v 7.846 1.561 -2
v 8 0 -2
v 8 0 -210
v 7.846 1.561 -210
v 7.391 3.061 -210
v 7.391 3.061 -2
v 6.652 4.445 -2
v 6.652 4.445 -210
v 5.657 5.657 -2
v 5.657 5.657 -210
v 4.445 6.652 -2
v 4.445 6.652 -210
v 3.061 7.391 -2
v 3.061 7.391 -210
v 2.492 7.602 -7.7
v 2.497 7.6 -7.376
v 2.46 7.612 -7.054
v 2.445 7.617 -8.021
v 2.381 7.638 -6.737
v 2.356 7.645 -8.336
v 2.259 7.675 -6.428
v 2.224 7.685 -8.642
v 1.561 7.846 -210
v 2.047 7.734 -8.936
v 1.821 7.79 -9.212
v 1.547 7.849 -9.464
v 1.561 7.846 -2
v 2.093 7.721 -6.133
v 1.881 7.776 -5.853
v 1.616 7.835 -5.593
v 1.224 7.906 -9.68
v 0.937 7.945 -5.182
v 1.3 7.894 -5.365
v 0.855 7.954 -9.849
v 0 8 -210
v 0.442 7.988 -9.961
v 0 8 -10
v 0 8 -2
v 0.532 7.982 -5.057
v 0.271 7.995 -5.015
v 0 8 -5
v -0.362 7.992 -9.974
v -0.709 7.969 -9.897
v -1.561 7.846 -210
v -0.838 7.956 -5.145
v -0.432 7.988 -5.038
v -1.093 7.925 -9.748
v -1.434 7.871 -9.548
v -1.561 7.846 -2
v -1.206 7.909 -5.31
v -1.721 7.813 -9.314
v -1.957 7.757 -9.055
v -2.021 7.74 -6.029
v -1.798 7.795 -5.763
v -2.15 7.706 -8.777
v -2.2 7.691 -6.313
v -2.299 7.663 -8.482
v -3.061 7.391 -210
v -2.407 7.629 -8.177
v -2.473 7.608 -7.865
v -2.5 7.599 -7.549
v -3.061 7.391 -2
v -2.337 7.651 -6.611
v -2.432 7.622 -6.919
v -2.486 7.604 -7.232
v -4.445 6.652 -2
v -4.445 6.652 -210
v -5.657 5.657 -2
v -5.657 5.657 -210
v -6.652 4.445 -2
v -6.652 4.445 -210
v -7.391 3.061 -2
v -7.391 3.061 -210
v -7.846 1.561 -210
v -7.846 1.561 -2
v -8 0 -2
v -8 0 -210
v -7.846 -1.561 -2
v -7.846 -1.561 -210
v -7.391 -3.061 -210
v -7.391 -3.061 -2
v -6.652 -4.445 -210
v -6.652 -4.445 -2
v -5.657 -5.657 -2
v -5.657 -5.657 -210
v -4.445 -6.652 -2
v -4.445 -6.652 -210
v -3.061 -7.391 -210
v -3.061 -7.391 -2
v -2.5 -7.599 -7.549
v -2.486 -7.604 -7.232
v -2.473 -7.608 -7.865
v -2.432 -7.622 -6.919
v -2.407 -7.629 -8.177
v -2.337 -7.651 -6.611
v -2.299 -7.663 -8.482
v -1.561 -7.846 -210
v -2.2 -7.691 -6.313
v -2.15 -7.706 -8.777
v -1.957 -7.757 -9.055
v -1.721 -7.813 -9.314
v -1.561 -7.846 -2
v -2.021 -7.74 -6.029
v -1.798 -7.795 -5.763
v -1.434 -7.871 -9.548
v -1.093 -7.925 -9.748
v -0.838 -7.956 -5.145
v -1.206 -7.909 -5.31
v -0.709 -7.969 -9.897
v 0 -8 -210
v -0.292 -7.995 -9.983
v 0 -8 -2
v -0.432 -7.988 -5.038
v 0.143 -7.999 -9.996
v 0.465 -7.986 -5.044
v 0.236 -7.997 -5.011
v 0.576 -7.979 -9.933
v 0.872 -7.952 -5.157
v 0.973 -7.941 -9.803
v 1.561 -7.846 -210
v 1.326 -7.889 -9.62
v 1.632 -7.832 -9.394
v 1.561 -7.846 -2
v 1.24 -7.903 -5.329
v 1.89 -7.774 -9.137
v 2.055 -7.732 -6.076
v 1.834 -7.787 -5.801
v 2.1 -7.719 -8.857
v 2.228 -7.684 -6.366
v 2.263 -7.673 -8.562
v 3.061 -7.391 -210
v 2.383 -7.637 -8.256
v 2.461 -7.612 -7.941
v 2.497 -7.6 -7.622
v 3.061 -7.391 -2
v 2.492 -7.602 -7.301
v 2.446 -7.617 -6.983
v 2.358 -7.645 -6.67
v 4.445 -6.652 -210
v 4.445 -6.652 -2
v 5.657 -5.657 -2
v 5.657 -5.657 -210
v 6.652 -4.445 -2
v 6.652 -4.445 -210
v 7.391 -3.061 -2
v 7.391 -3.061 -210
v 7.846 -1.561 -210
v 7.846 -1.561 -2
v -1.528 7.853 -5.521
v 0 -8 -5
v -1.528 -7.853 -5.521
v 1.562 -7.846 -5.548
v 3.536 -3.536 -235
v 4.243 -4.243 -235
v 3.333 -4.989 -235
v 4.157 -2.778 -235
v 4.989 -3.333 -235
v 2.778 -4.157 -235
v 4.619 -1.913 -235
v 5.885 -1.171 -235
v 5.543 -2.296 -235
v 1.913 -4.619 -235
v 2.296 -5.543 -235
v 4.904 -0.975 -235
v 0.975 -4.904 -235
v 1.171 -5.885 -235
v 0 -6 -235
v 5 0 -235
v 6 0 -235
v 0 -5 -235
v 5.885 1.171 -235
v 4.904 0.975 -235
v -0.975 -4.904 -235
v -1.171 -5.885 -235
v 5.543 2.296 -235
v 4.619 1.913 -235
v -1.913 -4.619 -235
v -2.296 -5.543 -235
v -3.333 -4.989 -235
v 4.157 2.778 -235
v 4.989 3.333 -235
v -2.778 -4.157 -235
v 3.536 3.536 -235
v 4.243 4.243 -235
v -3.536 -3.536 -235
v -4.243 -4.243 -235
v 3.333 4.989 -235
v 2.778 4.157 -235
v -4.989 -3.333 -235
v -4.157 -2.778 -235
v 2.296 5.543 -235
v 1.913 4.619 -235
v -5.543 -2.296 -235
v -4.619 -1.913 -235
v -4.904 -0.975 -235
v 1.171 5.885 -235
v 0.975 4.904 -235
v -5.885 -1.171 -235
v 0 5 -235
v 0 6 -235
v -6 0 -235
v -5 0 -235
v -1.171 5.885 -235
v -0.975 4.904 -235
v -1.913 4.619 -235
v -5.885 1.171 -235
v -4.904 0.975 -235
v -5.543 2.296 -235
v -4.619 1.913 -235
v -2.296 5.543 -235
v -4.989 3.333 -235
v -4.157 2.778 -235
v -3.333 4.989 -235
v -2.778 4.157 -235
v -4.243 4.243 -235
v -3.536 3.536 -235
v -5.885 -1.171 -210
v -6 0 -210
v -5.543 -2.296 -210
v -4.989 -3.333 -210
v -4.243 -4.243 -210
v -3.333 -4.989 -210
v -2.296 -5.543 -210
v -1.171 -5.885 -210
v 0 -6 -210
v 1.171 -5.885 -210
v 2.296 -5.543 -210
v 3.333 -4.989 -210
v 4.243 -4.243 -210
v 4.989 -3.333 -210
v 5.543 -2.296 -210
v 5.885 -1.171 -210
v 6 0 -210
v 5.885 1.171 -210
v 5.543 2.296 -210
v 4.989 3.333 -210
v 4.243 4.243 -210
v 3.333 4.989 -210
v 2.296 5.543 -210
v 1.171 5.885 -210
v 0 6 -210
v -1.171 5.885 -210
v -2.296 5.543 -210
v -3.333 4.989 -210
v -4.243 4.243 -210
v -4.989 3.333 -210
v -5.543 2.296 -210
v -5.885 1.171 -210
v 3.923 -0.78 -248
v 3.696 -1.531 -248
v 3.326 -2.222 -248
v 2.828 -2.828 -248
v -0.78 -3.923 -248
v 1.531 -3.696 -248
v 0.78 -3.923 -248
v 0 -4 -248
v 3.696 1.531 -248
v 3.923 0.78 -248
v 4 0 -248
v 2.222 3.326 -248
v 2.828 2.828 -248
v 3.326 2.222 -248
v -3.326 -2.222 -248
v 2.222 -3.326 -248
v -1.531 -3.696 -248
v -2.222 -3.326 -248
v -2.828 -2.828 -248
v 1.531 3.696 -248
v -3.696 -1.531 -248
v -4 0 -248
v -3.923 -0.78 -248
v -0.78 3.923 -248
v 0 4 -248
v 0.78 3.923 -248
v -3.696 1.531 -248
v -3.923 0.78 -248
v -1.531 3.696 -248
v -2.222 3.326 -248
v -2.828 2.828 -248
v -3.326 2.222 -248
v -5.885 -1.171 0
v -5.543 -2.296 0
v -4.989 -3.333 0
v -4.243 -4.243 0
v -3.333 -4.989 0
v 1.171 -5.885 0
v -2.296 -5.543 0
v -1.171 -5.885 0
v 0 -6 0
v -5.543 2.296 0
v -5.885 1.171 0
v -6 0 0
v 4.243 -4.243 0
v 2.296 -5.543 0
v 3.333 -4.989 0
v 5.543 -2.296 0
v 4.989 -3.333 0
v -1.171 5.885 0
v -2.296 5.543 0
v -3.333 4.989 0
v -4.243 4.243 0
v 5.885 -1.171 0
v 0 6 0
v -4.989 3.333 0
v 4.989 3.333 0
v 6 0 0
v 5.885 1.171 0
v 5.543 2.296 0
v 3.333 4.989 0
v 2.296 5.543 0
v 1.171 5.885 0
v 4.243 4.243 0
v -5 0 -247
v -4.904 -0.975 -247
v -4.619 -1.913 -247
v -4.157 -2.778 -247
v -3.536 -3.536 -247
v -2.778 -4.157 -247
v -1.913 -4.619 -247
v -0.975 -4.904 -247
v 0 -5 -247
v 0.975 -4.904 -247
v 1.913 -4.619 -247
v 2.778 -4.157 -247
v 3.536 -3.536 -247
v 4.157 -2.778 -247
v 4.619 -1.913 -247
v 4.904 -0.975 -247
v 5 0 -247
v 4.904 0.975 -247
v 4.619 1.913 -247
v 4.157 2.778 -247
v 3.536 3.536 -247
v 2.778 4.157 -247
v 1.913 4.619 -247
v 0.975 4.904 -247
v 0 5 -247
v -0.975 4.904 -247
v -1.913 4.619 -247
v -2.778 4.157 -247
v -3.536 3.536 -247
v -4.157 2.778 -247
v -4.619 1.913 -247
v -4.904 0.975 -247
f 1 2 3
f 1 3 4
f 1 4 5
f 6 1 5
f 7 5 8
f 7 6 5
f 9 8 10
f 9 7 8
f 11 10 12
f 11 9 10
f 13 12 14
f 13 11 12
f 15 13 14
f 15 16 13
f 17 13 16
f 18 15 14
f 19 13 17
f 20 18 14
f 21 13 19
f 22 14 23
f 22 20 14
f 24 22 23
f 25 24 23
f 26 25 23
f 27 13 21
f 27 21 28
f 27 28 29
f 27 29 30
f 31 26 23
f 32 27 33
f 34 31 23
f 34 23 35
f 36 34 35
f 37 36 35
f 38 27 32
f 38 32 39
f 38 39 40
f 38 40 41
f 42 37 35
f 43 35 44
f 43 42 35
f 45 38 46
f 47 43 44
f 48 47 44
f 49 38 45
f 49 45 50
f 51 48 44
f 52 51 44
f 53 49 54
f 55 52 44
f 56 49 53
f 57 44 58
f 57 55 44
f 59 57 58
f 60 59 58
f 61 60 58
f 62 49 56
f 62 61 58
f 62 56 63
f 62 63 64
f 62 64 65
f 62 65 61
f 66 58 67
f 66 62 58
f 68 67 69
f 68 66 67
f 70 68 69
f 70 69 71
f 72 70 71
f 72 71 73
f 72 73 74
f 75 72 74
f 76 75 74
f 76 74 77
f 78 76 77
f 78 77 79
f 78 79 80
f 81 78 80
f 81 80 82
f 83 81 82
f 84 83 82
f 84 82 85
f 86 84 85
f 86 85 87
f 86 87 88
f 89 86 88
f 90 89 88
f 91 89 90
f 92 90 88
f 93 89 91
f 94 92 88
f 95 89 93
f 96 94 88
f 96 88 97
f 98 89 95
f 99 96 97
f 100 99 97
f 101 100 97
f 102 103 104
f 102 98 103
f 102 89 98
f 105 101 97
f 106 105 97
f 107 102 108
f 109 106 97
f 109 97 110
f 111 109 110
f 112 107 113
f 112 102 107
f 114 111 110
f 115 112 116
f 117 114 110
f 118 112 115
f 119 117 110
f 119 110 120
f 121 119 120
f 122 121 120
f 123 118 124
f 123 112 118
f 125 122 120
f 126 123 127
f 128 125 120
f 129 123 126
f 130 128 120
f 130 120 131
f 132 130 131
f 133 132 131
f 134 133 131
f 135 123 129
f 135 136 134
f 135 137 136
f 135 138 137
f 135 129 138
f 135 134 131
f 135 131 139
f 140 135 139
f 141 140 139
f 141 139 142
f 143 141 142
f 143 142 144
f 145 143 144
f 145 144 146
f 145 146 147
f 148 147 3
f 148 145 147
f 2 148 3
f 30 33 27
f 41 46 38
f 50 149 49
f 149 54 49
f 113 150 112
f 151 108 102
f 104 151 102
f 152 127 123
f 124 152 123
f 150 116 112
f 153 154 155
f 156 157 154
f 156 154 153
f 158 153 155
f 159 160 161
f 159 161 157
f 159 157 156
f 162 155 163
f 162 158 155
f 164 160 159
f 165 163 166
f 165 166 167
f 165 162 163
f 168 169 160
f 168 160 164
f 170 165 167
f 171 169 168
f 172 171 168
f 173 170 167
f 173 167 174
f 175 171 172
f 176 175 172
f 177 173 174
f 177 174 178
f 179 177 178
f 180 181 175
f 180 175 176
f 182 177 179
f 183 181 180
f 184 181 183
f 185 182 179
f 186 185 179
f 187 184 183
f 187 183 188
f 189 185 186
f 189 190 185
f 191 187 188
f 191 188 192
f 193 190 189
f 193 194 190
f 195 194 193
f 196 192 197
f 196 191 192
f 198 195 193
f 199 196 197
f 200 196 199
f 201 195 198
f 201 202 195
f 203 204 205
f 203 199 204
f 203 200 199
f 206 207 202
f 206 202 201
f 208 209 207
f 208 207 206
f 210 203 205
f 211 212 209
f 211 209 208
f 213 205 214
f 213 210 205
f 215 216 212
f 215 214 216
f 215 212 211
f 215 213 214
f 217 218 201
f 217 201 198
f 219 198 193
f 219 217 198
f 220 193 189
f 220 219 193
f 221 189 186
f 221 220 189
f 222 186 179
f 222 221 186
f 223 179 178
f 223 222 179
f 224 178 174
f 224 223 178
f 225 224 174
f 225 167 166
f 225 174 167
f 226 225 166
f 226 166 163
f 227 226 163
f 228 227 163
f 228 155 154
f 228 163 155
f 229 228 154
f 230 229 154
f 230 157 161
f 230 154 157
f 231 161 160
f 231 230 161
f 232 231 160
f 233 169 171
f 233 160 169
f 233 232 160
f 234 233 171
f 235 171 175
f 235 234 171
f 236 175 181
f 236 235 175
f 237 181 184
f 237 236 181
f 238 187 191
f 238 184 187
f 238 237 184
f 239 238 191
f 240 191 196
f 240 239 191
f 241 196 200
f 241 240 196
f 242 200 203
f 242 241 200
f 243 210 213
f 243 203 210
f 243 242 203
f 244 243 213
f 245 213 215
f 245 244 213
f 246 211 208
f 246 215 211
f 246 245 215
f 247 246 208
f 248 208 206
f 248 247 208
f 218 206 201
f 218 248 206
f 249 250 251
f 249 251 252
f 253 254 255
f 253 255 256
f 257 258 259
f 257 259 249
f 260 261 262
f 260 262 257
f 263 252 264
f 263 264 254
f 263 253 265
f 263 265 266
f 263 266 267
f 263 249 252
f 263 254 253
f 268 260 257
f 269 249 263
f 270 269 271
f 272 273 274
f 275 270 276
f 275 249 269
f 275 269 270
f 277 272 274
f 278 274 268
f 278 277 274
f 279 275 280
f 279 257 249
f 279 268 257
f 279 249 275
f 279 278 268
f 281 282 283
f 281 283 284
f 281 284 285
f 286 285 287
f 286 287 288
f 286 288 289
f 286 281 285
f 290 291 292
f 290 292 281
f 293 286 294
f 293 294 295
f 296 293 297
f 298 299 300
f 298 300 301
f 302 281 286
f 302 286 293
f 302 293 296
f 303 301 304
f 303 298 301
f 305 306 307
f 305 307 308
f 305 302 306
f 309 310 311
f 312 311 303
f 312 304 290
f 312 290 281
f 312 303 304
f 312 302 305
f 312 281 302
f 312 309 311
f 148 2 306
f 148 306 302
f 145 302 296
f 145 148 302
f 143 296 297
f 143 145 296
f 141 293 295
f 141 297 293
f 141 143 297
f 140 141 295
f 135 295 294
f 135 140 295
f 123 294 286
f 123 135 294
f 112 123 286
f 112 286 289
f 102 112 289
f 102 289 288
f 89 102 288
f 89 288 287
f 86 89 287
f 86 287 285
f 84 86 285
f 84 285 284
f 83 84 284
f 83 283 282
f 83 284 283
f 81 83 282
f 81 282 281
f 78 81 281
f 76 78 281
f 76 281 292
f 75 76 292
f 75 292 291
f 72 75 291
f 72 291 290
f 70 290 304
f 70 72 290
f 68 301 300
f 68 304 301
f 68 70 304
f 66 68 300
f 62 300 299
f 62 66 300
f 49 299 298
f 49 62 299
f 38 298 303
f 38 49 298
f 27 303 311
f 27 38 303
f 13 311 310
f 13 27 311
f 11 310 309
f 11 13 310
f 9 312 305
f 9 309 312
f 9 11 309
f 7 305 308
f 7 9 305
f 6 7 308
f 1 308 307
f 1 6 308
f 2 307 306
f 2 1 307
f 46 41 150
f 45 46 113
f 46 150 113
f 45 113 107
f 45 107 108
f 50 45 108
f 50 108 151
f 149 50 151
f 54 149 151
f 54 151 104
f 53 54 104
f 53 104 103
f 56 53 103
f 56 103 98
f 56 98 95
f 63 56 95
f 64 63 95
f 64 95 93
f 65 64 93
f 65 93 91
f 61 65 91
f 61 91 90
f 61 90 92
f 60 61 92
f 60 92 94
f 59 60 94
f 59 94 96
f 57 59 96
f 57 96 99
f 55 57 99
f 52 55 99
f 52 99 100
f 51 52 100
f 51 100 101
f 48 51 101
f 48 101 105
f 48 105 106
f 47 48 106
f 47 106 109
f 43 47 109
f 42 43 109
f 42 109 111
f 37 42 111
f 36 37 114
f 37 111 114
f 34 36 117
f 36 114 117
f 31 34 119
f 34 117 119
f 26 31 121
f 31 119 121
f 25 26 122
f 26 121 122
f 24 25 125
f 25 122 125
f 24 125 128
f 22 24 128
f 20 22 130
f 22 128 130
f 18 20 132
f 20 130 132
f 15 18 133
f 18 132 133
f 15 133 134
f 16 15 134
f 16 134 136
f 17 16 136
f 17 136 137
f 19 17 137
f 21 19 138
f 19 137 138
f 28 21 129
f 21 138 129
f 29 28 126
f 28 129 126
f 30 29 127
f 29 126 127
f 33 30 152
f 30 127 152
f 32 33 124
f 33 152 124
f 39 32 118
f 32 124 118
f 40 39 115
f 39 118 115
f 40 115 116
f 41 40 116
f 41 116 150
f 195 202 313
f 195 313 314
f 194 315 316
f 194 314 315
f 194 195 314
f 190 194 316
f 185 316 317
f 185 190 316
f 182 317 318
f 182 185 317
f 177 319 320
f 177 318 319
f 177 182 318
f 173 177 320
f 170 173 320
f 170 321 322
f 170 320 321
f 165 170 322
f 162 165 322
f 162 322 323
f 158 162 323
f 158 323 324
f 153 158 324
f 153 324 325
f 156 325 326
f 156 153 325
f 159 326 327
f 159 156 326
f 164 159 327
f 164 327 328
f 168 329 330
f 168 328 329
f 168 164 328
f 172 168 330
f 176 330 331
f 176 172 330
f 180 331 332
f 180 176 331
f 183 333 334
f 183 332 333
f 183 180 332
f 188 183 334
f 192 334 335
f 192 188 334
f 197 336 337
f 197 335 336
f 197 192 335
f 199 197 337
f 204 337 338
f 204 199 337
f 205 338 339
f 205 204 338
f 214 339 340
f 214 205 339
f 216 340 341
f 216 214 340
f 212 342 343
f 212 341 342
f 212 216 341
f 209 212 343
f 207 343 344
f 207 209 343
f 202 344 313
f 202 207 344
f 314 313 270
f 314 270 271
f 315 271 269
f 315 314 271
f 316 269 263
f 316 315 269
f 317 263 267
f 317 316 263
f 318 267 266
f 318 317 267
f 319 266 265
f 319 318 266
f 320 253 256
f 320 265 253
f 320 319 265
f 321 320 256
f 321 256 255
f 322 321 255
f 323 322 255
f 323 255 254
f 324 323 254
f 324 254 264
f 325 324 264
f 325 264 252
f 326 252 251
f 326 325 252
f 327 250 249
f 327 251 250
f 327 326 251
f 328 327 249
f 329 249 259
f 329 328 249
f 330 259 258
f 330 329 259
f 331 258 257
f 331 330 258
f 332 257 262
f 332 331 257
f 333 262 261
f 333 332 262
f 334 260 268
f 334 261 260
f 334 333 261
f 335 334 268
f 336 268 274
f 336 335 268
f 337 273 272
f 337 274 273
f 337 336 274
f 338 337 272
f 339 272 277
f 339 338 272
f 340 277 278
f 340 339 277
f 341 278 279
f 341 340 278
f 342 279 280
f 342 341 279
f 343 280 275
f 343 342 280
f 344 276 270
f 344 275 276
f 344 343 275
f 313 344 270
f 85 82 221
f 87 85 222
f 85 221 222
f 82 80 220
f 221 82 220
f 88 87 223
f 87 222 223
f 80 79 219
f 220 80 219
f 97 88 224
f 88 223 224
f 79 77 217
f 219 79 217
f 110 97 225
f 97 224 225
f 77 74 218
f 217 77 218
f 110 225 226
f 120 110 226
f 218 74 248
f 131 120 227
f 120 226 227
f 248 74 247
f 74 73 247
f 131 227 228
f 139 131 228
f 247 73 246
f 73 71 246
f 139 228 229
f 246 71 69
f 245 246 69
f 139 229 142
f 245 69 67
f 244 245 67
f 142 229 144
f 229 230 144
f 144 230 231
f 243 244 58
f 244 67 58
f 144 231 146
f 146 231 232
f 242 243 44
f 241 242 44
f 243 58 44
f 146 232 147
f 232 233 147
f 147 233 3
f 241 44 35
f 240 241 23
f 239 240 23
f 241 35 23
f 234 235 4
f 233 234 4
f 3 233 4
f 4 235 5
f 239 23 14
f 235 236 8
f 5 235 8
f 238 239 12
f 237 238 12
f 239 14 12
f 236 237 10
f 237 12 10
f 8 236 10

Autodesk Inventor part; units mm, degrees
ref_plane "YZ Plane" through (0, 0, 0) normal (1, 0, 0) x (0, 1, 0)
ref_plane "XZ Plane" through (0, 0, 0) normal (0, 1, 0) x (-1, 0, 0)
ref_plane "XY Plane" through (0, 0, 0) normal (0, 0, 1) x (1, 0, 0)
sketch "Szkic1" plane through (0, 0, 0) normal (0, 0, 1) x (1, 0, 0)
  circle A0 centre (0, 0) radius 8
  dimension "d0" = 16
extrude "Wyciągnięcie proste1" add sketch "Szkic1" against normal blind 210
sketch "Szkic2" plane through (0, 0, 0) normal (0, 0, 1) x (1, 0, 0)
  line L0 (0, 0) -> (0, 8)
  circle A0 centre (0, 0) radius 8 projected
  circle A1 centre (0, 0) radius 8 projected
  circle A2 centre (0, 0) radius 8 projected
sketch3d "Szkic 3D1"
sketch "Szkic3" plane through (0, 0, 0) normal (0, 0, 1) x (1, 0, 0)
  circle A0 centre (0, 0) radius 8
  circle A1 centre (0, 0) radius 8
  point P0 (0, 8)
sketch3d "Szkic 3D2"
sketch "Szkic4" plane through (0, 0, 0) normal (0, 0, 1) x (1, 0, 0)
  circle A0 centre (0, 0) radius 8 projected
  circle A1 centre (0, 0) radius 8 projected
  point P0 (0, 8)
hole "Otwór1" at (0, 8, -7.5) direction (0, -1, 0) diameter 5 end through all
chamfer "Faza2" distance 2 angle 45 1 edges at (-8, 0, 0)
sketch "Szkic6" plane through (0, 0, -210) normal (0, 0, -1) x (-1, 0, 0)
  point P0 (0, 0)
sketch "Szkic7" plane through (0, 0, -210) normal (0, 0, -1) x (-1, 0, 0)
  circle A0 centre (0, 0) radius 6
extrude "Wyciągnięcie proste2" add sketch "Szkic7" along normal blind 25
sketch "Szkic8" plane through (0, 0, -235) normal (0, 0, -1) x (-1, 0, 0)
  circle A0 centre (0, 0) radius 5
extrude "Wyciągnięcie proste3" add sketch "Szkic8" along normal blind 13
chamfer "Faza3" distance 1 angle 45 1 edges at (5, 0, -248)
